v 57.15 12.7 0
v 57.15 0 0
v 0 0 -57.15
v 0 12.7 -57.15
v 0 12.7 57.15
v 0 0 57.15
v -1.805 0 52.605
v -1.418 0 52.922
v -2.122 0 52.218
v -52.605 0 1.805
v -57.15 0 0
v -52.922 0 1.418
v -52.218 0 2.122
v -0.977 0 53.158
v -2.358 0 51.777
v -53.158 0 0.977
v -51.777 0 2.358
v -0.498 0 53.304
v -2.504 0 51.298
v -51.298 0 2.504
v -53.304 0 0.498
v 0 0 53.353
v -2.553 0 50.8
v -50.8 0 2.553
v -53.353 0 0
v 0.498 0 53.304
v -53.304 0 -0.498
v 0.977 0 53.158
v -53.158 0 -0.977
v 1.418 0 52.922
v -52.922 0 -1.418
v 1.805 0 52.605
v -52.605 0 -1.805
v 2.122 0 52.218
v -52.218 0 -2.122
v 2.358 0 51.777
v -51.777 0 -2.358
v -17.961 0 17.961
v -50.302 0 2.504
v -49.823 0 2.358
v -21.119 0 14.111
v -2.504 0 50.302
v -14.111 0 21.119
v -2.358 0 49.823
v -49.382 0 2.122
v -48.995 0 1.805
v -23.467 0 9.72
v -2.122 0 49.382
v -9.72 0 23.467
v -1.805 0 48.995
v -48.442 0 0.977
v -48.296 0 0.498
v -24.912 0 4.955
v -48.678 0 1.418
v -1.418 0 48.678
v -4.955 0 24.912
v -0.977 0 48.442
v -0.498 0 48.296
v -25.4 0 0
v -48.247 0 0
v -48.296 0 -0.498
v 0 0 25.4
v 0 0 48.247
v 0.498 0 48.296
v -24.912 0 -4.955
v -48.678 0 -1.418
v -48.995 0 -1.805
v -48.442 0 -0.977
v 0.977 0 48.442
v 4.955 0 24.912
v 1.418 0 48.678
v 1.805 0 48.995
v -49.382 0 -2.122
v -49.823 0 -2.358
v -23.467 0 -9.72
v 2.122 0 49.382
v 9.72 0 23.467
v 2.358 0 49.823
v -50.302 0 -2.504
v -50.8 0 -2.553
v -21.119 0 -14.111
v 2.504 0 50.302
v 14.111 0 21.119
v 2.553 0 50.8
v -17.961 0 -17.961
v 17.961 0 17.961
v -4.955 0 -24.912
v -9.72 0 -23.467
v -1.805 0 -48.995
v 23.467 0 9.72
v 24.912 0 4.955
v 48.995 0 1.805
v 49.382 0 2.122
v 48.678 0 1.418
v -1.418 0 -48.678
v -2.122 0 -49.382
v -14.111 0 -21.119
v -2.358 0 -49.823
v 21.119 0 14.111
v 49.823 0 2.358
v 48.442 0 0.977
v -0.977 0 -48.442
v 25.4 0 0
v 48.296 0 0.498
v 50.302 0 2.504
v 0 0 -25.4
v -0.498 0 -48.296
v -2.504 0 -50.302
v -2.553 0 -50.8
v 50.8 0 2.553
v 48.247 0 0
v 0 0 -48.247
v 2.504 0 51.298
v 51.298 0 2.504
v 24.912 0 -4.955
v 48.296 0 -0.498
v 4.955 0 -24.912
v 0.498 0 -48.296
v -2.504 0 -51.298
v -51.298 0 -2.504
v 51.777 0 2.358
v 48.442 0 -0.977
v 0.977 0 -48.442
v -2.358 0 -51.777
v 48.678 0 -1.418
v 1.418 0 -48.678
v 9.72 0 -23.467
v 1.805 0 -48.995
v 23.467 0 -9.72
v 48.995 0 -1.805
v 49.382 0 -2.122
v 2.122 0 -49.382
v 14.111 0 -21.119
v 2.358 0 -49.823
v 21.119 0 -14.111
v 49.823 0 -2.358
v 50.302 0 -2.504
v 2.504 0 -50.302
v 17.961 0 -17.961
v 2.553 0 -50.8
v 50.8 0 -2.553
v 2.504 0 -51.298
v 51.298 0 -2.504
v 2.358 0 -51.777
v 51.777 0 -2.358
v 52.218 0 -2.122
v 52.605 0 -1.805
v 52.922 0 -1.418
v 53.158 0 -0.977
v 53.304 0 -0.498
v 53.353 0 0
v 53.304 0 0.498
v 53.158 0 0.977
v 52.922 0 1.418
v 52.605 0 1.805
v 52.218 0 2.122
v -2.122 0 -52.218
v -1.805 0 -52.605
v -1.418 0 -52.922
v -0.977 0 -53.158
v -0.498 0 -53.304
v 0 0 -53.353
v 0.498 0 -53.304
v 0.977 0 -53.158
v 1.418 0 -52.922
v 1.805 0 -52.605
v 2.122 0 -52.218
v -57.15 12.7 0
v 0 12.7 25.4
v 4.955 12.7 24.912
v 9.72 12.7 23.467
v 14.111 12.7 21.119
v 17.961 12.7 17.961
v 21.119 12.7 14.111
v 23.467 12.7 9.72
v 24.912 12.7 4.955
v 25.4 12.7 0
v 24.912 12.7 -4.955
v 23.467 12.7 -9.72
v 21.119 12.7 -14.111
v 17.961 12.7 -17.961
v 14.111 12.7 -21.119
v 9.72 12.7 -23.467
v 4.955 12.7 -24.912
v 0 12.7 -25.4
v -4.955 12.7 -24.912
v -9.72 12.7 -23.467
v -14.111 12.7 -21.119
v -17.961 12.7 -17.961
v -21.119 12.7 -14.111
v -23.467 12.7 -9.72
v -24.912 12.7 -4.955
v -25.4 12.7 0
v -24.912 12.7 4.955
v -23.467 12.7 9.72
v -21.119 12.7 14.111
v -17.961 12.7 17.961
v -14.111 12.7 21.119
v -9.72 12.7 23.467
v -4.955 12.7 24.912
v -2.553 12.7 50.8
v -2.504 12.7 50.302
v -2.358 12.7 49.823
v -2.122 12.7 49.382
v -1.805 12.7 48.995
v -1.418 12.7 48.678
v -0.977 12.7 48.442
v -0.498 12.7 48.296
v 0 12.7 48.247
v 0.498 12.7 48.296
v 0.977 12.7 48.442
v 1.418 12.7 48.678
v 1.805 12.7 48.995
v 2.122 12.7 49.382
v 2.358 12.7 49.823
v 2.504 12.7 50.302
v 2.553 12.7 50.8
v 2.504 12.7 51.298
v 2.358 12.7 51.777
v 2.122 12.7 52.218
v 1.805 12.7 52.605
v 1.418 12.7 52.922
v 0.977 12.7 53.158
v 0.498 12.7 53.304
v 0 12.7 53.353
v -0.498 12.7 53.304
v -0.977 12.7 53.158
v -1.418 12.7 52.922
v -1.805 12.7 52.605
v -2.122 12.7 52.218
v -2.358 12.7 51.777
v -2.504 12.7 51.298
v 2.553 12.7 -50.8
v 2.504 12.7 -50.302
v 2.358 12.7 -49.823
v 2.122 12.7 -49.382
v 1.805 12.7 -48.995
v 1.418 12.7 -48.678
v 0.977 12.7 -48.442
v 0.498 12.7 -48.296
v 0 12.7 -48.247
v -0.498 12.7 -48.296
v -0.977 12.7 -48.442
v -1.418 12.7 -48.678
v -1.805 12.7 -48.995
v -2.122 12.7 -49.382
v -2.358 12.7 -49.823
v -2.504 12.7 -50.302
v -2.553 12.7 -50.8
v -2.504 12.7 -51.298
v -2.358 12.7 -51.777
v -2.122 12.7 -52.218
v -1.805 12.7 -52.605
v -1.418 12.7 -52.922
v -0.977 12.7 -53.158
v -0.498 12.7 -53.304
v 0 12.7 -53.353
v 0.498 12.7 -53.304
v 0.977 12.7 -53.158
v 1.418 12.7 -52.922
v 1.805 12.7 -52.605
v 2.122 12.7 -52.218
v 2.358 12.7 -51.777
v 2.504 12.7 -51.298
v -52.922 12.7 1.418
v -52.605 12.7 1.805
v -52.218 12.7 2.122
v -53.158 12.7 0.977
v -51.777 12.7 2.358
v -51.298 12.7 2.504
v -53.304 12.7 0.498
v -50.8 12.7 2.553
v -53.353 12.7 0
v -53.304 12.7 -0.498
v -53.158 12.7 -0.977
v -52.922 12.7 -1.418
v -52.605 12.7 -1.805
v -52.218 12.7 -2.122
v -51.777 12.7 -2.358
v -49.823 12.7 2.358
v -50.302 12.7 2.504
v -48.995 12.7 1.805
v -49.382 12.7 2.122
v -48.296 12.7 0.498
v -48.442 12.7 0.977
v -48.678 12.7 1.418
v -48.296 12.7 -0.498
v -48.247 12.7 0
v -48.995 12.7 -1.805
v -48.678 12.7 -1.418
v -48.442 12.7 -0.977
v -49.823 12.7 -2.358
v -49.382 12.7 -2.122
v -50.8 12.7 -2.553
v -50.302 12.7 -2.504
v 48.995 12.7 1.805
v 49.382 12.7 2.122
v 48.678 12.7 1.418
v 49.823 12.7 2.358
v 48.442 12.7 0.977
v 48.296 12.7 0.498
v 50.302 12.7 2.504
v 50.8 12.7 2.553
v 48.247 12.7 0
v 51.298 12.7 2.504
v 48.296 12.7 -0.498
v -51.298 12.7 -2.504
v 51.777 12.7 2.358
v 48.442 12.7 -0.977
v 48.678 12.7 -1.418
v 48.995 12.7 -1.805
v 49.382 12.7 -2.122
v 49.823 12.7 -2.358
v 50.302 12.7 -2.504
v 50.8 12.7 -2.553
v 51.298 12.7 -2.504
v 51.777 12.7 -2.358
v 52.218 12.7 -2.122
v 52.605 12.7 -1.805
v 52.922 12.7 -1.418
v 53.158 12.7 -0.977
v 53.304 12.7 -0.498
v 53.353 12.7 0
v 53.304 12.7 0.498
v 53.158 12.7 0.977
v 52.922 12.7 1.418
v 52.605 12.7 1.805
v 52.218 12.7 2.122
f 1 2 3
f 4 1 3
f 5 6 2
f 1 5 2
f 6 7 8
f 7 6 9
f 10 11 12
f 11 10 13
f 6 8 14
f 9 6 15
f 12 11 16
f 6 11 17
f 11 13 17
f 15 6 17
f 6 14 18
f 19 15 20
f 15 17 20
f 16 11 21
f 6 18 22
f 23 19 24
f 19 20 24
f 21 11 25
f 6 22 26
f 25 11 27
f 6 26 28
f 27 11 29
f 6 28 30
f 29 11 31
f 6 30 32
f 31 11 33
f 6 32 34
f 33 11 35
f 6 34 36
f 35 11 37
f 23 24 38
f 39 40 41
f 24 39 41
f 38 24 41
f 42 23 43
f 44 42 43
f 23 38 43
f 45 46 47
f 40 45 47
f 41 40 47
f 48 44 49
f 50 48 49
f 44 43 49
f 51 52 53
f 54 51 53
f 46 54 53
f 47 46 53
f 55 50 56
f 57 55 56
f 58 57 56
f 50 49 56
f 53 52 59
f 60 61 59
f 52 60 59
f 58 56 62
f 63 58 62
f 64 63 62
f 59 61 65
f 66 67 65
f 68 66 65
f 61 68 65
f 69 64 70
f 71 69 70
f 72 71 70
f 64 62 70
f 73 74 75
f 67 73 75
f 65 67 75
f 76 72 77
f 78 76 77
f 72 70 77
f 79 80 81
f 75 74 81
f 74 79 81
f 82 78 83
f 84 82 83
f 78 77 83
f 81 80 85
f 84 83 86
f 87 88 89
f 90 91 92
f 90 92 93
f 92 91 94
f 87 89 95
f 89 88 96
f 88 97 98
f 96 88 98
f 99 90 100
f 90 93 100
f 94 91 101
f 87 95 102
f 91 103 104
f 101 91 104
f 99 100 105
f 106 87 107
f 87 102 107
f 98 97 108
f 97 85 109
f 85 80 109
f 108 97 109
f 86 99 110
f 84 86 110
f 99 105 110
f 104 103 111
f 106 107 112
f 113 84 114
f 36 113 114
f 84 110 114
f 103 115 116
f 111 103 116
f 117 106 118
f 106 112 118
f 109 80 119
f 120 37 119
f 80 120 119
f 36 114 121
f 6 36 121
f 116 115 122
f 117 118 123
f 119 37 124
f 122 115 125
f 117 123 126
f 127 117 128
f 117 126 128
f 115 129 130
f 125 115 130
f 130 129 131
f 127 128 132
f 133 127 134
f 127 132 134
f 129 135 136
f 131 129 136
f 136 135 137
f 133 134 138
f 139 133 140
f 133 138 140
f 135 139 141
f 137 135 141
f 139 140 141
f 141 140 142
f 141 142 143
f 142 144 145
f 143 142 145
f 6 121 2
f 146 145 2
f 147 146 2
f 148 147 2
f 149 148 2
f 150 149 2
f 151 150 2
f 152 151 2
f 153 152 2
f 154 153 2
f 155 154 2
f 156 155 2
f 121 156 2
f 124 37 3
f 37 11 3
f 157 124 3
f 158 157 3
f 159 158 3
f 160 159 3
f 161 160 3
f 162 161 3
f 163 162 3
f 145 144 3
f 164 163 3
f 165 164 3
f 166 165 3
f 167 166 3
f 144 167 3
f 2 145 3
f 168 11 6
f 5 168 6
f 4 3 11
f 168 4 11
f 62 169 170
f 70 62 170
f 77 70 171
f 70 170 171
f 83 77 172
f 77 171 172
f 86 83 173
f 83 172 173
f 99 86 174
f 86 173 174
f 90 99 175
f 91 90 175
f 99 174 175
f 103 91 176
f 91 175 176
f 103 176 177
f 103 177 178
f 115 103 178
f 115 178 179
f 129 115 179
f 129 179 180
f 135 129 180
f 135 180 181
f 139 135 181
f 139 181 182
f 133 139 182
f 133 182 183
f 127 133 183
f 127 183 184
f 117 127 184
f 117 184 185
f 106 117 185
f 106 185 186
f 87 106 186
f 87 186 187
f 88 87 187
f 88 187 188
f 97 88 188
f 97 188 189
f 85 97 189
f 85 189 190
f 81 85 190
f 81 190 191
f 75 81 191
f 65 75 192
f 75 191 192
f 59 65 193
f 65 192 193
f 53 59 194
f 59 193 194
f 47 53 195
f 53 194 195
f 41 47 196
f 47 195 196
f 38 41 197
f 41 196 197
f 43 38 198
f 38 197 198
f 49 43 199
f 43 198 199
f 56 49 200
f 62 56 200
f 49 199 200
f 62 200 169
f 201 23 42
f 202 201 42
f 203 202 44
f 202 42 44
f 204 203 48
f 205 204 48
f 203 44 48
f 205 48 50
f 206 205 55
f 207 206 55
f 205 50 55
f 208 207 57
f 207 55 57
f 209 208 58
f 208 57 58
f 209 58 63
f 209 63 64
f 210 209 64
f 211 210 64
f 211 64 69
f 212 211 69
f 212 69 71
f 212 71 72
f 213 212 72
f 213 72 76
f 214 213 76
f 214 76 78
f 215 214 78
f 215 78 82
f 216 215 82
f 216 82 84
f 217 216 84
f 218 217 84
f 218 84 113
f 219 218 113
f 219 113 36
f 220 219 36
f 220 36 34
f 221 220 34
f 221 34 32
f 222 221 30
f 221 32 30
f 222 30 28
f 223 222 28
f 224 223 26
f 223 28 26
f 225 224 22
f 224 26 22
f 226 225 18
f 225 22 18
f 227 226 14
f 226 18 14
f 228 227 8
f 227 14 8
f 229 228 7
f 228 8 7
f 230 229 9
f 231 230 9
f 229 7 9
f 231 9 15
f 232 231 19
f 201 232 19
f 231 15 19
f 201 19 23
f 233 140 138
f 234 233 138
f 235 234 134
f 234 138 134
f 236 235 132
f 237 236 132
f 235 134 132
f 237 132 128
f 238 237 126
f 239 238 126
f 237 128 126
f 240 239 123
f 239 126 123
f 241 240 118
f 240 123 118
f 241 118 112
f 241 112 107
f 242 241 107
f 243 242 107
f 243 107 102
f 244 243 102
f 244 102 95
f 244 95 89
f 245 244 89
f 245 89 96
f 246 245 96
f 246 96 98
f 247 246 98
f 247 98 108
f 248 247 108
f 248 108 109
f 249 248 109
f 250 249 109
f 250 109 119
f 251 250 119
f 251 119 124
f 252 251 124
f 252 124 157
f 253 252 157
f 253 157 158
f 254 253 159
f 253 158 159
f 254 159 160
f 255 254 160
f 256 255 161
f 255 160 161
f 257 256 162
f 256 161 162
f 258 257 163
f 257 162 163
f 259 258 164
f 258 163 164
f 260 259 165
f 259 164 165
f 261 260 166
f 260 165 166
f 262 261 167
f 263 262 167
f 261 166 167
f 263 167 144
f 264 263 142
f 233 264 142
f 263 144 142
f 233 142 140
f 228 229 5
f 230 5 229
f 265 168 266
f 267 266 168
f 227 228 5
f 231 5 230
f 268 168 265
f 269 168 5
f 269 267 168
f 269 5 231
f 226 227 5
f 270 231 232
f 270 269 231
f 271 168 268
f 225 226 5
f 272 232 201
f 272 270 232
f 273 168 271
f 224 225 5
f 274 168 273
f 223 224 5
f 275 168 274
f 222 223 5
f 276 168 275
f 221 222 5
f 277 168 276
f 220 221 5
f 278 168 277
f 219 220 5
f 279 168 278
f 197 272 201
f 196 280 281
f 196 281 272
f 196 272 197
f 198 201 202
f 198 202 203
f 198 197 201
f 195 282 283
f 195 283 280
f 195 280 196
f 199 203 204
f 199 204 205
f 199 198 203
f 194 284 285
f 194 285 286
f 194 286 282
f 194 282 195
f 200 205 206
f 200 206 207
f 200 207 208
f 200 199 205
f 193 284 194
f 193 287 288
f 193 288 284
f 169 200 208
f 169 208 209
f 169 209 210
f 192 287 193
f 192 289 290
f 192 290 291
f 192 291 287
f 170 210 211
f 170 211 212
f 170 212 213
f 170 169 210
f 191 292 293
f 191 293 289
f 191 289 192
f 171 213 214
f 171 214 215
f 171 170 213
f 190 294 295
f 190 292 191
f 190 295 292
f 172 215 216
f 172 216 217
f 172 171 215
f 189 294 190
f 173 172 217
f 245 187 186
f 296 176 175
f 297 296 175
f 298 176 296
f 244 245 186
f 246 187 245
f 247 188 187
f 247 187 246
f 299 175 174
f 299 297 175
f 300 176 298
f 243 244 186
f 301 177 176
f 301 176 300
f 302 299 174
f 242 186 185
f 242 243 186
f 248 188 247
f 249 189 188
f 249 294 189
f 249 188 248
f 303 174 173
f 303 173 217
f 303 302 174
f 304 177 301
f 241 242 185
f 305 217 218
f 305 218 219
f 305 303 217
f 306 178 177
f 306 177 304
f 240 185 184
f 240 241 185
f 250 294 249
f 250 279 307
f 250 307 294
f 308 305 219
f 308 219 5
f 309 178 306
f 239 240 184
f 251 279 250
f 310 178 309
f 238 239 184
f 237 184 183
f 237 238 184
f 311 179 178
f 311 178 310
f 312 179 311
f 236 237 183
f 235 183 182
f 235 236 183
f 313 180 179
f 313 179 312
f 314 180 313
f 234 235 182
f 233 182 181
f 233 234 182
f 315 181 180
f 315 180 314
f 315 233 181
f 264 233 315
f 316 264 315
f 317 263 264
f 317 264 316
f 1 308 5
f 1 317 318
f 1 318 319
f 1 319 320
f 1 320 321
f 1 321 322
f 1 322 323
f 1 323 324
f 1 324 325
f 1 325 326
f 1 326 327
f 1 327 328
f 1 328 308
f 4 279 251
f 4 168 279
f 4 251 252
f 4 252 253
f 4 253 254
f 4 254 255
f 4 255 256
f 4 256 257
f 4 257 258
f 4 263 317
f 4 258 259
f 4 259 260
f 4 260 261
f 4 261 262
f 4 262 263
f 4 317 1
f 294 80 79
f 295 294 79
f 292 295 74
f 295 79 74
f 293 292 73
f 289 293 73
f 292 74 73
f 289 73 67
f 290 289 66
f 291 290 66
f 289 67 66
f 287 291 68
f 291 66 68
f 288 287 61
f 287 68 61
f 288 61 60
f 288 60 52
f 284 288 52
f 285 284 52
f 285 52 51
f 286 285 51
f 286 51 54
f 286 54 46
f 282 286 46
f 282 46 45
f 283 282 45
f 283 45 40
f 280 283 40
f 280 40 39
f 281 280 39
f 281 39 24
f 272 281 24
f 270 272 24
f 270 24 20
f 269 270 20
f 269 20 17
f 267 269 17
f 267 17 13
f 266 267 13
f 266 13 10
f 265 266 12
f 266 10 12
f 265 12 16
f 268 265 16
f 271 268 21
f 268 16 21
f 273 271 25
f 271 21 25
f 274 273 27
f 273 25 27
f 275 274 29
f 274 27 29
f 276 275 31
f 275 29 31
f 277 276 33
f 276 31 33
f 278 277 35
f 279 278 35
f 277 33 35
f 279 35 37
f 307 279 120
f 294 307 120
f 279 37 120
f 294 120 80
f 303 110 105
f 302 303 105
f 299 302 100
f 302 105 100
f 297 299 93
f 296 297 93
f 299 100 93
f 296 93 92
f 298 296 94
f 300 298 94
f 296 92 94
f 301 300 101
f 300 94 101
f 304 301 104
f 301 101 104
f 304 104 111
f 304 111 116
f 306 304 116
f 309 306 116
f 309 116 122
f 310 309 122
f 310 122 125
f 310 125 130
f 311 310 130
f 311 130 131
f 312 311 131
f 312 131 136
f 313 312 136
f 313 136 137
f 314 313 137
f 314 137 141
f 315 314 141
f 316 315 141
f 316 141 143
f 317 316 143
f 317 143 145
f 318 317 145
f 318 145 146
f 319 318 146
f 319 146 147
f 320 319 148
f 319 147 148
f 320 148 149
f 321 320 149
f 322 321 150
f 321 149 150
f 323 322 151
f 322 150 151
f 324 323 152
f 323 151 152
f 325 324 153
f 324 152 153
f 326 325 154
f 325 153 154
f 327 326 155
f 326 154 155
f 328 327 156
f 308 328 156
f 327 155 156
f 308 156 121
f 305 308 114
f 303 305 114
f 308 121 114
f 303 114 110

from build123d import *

# Parameters (mm, degrees)
BOSS_EXTRUDE1_DEPTH        = 12.7
SKETCH2_R                  = 25.4
CUT_EXTRUDE1_DEPTH         = 82.814026915
F_7_0_201_DIAMETER_HOLE1_D = 5.1054
CIRPATTERN1_COUNT          = 4


with BuildPart() as part:
    # Sketch1 → Boss-Extrude1 (new body)
    with BuildSketch(Plane(origin=(0, 0, 0), x_dir=(1, 0, 0), z_dir=(0, 1, 0))):
        Polygon((0, -57.15), (57.15, 0), (0, 57.15), (-57.15, 0), align=None)
    extrude(amount=BOSS_EXTRUDE1_DEPTH)

    # Sketch2 → Cut-Extrude1 (cut, through all)
    with BuildSketch(Plane(origin=(0, 12.7, 0), x_dir=(1, 0, 0), z_dir=(0, 1, 0))):
        with Locations(Location((0, 0, 0), (0, 0, 270))):
            Circle(SKETCH2_R)
    extrude(amount=-CUT_EXTRUDE1_DEPTH, mode=Mode.SUBTRACT)

    # #7 (0.201) Diameter Hole1 (through all)
    with Locations(Plane(origin=(0, 12.7, 0), x_dir=(-1, 0, 0), z_dir=(0, 1, 0))):
        with Locations((0, -50.8)):
            f_7_0_201_diameter_hole1 = Hole(F_7_0_201_DIAMETER_HOLE1_D / 2)

    # CirPattern1: #7 (0.201) Diameter Hole1 ×4 about axis
    cirpattern1_axis = Axis((0, 0, 0), (0, 1, 0))
    for i in range(1, CIRPATTERN1_COUNT):
        add(f_7_0_201_diameter_hole1.rotate(cirpattern1_axis, i * 360 / CIRPATTERN1_COUNT), mode=Mode.SUBTRACT)


solid = part.part
